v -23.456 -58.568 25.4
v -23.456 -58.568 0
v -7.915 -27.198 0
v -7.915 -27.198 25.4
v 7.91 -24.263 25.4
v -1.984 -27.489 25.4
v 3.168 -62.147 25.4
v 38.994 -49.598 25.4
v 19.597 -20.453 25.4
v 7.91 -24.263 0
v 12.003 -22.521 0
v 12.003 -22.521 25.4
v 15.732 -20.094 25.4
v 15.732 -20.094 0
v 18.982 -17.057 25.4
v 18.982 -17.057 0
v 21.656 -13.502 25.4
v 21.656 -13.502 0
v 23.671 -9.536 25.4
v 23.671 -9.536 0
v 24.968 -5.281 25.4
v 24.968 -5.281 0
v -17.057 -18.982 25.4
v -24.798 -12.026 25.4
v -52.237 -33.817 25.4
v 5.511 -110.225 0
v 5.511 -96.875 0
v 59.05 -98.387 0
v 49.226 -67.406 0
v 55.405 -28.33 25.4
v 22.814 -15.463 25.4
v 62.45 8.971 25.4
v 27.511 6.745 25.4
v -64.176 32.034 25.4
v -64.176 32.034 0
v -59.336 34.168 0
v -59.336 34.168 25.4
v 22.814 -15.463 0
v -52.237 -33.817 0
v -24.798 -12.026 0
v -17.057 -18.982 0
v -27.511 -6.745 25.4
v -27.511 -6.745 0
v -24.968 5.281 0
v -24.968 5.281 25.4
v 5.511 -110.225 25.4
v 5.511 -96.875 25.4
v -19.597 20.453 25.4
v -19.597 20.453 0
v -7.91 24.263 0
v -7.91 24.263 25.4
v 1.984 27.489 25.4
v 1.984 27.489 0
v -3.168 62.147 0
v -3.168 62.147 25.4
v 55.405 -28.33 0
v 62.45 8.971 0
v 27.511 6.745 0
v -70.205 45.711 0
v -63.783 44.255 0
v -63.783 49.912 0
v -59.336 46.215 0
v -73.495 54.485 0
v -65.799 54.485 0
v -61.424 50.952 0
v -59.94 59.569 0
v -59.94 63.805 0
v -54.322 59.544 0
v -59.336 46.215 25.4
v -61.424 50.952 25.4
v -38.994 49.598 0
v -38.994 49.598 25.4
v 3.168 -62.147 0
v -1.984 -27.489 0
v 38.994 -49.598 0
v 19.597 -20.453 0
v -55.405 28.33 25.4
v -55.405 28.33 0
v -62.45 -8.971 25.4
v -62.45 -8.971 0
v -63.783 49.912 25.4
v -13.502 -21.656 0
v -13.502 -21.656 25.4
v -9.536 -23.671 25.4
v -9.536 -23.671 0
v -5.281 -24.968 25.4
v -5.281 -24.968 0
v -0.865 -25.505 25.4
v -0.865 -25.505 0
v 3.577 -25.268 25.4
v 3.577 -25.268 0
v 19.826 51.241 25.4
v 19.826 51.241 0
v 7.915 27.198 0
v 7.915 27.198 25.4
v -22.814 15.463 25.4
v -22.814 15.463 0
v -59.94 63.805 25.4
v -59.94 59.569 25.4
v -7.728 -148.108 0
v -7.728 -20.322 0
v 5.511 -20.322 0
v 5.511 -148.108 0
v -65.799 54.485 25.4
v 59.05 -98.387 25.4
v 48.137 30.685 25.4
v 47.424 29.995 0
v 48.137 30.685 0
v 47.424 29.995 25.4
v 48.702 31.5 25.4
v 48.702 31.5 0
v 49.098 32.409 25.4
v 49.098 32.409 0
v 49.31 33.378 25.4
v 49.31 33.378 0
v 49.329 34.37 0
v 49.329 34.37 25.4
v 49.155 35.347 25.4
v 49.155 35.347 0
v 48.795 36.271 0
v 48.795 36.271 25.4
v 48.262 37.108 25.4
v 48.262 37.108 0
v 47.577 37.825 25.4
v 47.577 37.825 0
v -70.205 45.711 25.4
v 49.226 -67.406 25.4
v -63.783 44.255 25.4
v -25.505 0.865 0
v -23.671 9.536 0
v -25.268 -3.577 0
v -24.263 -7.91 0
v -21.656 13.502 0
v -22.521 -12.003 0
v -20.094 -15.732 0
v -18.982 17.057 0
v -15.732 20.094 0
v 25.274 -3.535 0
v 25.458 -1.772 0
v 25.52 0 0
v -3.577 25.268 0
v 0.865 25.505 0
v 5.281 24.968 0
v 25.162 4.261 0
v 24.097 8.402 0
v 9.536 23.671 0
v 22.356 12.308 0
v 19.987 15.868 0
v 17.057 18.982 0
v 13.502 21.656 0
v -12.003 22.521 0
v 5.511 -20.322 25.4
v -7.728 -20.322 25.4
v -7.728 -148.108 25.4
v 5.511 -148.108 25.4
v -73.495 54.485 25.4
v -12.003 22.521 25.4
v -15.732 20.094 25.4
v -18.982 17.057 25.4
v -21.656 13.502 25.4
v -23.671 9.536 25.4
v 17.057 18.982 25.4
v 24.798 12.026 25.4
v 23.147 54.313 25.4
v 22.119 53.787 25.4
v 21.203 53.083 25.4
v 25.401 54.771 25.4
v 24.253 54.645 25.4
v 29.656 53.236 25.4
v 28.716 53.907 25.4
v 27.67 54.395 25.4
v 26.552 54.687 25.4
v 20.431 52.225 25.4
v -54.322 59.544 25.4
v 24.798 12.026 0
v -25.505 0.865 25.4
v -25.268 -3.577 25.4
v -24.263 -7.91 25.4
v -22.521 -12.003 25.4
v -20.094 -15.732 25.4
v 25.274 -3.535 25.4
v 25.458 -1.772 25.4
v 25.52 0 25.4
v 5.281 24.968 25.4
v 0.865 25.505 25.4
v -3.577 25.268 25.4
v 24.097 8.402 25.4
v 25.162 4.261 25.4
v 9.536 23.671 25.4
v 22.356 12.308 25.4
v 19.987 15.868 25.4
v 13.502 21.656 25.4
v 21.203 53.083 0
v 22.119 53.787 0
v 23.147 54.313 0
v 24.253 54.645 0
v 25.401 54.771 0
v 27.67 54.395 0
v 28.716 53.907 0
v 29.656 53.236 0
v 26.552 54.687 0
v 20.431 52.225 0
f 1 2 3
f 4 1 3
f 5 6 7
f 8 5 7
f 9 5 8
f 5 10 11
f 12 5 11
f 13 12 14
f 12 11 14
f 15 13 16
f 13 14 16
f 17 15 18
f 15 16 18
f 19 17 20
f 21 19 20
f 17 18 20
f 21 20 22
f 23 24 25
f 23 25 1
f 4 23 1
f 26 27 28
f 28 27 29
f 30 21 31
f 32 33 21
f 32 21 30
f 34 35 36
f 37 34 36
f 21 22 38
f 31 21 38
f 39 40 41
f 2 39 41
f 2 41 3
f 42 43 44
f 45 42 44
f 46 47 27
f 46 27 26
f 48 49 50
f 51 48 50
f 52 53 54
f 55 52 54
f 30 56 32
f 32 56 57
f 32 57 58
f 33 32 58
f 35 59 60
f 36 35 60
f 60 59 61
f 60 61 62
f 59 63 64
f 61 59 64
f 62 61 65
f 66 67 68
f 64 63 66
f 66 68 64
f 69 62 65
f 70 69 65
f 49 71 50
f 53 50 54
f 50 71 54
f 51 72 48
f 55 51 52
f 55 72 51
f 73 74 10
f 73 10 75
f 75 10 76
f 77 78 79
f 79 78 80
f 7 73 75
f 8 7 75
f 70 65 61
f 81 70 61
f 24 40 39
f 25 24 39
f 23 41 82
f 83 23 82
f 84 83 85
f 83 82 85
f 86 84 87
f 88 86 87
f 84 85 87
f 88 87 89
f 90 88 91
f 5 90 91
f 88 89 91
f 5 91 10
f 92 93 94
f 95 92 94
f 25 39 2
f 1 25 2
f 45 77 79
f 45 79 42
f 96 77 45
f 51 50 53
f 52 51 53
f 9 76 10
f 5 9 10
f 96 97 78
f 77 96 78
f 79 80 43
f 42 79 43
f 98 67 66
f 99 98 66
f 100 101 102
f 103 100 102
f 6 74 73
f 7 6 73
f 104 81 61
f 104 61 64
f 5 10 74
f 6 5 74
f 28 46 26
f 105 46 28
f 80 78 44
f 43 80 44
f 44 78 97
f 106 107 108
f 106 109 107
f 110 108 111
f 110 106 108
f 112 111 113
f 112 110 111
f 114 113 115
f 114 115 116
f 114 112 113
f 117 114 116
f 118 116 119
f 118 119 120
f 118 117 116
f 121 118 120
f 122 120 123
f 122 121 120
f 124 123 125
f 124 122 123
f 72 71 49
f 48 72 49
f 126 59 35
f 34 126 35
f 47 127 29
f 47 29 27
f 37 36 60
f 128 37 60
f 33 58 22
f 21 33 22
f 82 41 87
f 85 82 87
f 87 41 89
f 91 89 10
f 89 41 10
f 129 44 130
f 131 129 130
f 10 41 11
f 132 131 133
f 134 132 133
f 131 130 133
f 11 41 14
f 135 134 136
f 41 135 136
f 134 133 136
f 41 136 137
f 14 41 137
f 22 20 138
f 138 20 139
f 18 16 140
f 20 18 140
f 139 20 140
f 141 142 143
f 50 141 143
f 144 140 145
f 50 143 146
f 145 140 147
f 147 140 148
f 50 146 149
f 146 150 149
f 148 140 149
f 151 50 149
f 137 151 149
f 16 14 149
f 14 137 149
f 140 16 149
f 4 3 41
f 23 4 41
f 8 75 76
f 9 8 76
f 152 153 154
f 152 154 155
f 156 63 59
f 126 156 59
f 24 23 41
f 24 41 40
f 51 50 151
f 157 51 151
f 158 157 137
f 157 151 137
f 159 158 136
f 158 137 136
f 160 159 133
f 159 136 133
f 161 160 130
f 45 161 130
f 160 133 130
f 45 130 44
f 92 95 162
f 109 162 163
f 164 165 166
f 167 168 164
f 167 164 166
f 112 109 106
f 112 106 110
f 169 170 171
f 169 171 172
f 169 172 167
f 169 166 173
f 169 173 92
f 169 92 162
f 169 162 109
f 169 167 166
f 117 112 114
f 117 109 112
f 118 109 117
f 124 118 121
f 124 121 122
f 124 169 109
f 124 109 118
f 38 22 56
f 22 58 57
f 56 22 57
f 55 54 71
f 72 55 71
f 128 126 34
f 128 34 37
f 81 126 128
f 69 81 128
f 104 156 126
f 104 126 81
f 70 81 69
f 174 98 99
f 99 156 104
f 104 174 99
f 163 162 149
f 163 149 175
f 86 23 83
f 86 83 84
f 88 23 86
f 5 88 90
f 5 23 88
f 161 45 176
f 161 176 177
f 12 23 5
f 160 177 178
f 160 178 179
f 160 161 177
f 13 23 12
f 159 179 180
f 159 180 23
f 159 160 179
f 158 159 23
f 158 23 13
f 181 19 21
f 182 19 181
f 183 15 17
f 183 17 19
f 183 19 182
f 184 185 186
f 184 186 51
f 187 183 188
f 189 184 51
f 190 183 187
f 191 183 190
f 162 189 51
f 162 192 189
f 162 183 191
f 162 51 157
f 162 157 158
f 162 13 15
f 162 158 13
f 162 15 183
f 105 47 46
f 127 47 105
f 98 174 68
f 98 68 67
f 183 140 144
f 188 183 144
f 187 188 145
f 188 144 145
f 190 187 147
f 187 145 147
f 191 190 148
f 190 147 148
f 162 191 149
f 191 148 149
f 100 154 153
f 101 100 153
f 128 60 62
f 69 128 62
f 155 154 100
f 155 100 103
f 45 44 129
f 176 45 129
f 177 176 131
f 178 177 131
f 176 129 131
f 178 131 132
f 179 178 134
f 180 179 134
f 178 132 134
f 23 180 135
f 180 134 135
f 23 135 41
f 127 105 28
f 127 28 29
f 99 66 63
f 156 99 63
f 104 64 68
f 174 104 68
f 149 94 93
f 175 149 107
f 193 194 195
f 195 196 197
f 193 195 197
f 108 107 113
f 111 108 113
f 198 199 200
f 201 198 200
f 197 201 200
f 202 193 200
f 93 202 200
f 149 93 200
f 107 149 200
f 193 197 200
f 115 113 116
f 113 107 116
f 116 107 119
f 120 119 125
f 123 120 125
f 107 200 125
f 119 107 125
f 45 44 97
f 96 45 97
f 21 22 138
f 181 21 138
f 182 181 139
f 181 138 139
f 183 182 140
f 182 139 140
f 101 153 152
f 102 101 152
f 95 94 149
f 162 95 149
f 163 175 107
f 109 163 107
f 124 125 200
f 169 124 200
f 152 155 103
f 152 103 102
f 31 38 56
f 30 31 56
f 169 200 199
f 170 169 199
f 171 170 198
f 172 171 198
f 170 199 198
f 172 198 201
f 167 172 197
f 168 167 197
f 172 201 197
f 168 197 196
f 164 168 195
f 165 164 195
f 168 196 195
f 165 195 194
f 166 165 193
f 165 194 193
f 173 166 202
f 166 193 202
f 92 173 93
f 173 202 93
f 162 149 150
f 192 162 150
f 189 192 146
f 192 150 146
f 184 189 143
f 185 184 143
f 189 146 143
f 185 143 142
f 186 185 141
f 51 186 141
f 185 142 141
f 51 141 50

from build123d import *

# Parameters (mm, degrees)
F1_DEPTH = 25.4
F2_W     = 13.239067
F2_H     = 127.785755
F3_DEPTH = 25.4
F5_DEPTH = 25.4
F6_R     = 5.08
F8_DEPTH = 25.4


with BuildPart() as f1:
    # F0 (on Top) → F1 (new body)
    with BuildSketch(Plane.XY):
        with BuildLine():
            ThreePointArc((24.967536, -5.2811), (25.381471, -2.654956), (25.51995, 0))
            ThreePointArc((25.51995, 0), (23.308477, 10.391476), (17.057334, 18.98197))
            ThreePointArc((17.057334, 18.98197), (5.2811, 24.967536), (-7.910201, 24.26307))
            ThreePointArc((-7.910201, 24.26307), (-18.98197, 17.057334), (-24.967536, 5.2811))
            ThreePointArc((-24.967536, 5.2811), (-24.26307, -7.910201), (-17.057334, -18.98197))
            ThreePointArc((-17.057334, -18.98197), (-5.2811, -24.967536), (7.910201, -24.26307))
            ThreePointArc((7.910201, -24.26307), (18.98197, -17.057334), (24.967536, -5.2811))
        make_face()
        with BuildLine():
            Line((7.914659, 27.197644), (17.057334, 18.98197))
            Line((17.057334, 18.98197), (24.797997, 12.026155))
            Line((24.797997, 12.026155), (52.236743, 33.817176))
            Line((52.236743, 33.817176), (29.656374, 53.236297))
            ThreePointArc((29.656374, 53.236297), (24.25265, 54.644894), (19.82591, 51.240727))
            Line((19.82591, 51.240727), (7.914659, 27.197644))
        make_face()
        Polygon((-19.596521, 20.453117), (-7.910201, 24.26307), (1.984043, 27.488773), (-3.168162, 62.146935), (-38.993702, 49.597875), align=None)
        Polygon((-27.51118, -6.744527), (-24.967536, 5.2811), (-22.813954, 15.462618), (-55.404905, 28.329759), (-62.449871, -8.970598), align=None)
        Polygon((-7.914659, -27.197644), (-17.057334, -18.98197), (-24.797997, -12.026155), (-52.236743, -33.817176), (-23.456169, -58.568474), align=None)
        Polygon((19.596521, -20.453117), (7.910201, -24.26307), (-1.984043, -27.488773), (3.168162, -62.146935), (38.993702, -49.597875), align=None)
        Polygon((27.51118, 6.744527), (24.967536, -5.2811), (22.813954, -15.462618), (55.404905, -28.329759), (62.449871, 8.970598), align=None)
    extrude(amount=F1_DEPTH)

    # F6
    f6_edges = [f1.edges().sort_by_distance(p)[0] for p in [
        (52.236743, 33.817176, 12.7),
    ]]
    fillet(f6_edges, radius=F6_R)


with BuildPart() as f3:
    # F2 (on face) → F3 (new body)
    with BuildSketch(Plane.XY.offset(25.4)):
        with Locations((-1.10894, -84.215008)):
            Rectangle(F2_W, F2_H)
    extrude(amount=-F3_DEPTH)


with BuildPart() as f5:
    # F4 (on face) → F5 (new body)
    with BuildSketch(Plane.XY.offset(25.4)):
        Polygon((49.226433, -67.405827), (5.510593, -96.875302), (5.510593, -110.224724), (59.049591, -98.386556), align=None)
    extrude(amount=-F5_DEPTH)


with BuildPart() as f8:
    # F7 (on Top) → F8 (new body)
    with BuildSketch(Plane.XY):
        Polygon((-59.939828, 63.804574), (-59.939828, 59.568539), (-73.495127, 54.485299), (-70.20495, 45.711497), (-64.175859, 32.034345), (-59.336262, 34.167711), (-63.782956, 44.255154), (-59.336262, 46.215322), (-61.424321, 50.952139), (-63.782956, 49.912418), (-65.798749, 54.485299), (-54.32206, 59.544393), align=None)
    extrude(amount=F8_DEPTH)


solid = Compound([f1.part, f3.part, f5.part, f8.part])
